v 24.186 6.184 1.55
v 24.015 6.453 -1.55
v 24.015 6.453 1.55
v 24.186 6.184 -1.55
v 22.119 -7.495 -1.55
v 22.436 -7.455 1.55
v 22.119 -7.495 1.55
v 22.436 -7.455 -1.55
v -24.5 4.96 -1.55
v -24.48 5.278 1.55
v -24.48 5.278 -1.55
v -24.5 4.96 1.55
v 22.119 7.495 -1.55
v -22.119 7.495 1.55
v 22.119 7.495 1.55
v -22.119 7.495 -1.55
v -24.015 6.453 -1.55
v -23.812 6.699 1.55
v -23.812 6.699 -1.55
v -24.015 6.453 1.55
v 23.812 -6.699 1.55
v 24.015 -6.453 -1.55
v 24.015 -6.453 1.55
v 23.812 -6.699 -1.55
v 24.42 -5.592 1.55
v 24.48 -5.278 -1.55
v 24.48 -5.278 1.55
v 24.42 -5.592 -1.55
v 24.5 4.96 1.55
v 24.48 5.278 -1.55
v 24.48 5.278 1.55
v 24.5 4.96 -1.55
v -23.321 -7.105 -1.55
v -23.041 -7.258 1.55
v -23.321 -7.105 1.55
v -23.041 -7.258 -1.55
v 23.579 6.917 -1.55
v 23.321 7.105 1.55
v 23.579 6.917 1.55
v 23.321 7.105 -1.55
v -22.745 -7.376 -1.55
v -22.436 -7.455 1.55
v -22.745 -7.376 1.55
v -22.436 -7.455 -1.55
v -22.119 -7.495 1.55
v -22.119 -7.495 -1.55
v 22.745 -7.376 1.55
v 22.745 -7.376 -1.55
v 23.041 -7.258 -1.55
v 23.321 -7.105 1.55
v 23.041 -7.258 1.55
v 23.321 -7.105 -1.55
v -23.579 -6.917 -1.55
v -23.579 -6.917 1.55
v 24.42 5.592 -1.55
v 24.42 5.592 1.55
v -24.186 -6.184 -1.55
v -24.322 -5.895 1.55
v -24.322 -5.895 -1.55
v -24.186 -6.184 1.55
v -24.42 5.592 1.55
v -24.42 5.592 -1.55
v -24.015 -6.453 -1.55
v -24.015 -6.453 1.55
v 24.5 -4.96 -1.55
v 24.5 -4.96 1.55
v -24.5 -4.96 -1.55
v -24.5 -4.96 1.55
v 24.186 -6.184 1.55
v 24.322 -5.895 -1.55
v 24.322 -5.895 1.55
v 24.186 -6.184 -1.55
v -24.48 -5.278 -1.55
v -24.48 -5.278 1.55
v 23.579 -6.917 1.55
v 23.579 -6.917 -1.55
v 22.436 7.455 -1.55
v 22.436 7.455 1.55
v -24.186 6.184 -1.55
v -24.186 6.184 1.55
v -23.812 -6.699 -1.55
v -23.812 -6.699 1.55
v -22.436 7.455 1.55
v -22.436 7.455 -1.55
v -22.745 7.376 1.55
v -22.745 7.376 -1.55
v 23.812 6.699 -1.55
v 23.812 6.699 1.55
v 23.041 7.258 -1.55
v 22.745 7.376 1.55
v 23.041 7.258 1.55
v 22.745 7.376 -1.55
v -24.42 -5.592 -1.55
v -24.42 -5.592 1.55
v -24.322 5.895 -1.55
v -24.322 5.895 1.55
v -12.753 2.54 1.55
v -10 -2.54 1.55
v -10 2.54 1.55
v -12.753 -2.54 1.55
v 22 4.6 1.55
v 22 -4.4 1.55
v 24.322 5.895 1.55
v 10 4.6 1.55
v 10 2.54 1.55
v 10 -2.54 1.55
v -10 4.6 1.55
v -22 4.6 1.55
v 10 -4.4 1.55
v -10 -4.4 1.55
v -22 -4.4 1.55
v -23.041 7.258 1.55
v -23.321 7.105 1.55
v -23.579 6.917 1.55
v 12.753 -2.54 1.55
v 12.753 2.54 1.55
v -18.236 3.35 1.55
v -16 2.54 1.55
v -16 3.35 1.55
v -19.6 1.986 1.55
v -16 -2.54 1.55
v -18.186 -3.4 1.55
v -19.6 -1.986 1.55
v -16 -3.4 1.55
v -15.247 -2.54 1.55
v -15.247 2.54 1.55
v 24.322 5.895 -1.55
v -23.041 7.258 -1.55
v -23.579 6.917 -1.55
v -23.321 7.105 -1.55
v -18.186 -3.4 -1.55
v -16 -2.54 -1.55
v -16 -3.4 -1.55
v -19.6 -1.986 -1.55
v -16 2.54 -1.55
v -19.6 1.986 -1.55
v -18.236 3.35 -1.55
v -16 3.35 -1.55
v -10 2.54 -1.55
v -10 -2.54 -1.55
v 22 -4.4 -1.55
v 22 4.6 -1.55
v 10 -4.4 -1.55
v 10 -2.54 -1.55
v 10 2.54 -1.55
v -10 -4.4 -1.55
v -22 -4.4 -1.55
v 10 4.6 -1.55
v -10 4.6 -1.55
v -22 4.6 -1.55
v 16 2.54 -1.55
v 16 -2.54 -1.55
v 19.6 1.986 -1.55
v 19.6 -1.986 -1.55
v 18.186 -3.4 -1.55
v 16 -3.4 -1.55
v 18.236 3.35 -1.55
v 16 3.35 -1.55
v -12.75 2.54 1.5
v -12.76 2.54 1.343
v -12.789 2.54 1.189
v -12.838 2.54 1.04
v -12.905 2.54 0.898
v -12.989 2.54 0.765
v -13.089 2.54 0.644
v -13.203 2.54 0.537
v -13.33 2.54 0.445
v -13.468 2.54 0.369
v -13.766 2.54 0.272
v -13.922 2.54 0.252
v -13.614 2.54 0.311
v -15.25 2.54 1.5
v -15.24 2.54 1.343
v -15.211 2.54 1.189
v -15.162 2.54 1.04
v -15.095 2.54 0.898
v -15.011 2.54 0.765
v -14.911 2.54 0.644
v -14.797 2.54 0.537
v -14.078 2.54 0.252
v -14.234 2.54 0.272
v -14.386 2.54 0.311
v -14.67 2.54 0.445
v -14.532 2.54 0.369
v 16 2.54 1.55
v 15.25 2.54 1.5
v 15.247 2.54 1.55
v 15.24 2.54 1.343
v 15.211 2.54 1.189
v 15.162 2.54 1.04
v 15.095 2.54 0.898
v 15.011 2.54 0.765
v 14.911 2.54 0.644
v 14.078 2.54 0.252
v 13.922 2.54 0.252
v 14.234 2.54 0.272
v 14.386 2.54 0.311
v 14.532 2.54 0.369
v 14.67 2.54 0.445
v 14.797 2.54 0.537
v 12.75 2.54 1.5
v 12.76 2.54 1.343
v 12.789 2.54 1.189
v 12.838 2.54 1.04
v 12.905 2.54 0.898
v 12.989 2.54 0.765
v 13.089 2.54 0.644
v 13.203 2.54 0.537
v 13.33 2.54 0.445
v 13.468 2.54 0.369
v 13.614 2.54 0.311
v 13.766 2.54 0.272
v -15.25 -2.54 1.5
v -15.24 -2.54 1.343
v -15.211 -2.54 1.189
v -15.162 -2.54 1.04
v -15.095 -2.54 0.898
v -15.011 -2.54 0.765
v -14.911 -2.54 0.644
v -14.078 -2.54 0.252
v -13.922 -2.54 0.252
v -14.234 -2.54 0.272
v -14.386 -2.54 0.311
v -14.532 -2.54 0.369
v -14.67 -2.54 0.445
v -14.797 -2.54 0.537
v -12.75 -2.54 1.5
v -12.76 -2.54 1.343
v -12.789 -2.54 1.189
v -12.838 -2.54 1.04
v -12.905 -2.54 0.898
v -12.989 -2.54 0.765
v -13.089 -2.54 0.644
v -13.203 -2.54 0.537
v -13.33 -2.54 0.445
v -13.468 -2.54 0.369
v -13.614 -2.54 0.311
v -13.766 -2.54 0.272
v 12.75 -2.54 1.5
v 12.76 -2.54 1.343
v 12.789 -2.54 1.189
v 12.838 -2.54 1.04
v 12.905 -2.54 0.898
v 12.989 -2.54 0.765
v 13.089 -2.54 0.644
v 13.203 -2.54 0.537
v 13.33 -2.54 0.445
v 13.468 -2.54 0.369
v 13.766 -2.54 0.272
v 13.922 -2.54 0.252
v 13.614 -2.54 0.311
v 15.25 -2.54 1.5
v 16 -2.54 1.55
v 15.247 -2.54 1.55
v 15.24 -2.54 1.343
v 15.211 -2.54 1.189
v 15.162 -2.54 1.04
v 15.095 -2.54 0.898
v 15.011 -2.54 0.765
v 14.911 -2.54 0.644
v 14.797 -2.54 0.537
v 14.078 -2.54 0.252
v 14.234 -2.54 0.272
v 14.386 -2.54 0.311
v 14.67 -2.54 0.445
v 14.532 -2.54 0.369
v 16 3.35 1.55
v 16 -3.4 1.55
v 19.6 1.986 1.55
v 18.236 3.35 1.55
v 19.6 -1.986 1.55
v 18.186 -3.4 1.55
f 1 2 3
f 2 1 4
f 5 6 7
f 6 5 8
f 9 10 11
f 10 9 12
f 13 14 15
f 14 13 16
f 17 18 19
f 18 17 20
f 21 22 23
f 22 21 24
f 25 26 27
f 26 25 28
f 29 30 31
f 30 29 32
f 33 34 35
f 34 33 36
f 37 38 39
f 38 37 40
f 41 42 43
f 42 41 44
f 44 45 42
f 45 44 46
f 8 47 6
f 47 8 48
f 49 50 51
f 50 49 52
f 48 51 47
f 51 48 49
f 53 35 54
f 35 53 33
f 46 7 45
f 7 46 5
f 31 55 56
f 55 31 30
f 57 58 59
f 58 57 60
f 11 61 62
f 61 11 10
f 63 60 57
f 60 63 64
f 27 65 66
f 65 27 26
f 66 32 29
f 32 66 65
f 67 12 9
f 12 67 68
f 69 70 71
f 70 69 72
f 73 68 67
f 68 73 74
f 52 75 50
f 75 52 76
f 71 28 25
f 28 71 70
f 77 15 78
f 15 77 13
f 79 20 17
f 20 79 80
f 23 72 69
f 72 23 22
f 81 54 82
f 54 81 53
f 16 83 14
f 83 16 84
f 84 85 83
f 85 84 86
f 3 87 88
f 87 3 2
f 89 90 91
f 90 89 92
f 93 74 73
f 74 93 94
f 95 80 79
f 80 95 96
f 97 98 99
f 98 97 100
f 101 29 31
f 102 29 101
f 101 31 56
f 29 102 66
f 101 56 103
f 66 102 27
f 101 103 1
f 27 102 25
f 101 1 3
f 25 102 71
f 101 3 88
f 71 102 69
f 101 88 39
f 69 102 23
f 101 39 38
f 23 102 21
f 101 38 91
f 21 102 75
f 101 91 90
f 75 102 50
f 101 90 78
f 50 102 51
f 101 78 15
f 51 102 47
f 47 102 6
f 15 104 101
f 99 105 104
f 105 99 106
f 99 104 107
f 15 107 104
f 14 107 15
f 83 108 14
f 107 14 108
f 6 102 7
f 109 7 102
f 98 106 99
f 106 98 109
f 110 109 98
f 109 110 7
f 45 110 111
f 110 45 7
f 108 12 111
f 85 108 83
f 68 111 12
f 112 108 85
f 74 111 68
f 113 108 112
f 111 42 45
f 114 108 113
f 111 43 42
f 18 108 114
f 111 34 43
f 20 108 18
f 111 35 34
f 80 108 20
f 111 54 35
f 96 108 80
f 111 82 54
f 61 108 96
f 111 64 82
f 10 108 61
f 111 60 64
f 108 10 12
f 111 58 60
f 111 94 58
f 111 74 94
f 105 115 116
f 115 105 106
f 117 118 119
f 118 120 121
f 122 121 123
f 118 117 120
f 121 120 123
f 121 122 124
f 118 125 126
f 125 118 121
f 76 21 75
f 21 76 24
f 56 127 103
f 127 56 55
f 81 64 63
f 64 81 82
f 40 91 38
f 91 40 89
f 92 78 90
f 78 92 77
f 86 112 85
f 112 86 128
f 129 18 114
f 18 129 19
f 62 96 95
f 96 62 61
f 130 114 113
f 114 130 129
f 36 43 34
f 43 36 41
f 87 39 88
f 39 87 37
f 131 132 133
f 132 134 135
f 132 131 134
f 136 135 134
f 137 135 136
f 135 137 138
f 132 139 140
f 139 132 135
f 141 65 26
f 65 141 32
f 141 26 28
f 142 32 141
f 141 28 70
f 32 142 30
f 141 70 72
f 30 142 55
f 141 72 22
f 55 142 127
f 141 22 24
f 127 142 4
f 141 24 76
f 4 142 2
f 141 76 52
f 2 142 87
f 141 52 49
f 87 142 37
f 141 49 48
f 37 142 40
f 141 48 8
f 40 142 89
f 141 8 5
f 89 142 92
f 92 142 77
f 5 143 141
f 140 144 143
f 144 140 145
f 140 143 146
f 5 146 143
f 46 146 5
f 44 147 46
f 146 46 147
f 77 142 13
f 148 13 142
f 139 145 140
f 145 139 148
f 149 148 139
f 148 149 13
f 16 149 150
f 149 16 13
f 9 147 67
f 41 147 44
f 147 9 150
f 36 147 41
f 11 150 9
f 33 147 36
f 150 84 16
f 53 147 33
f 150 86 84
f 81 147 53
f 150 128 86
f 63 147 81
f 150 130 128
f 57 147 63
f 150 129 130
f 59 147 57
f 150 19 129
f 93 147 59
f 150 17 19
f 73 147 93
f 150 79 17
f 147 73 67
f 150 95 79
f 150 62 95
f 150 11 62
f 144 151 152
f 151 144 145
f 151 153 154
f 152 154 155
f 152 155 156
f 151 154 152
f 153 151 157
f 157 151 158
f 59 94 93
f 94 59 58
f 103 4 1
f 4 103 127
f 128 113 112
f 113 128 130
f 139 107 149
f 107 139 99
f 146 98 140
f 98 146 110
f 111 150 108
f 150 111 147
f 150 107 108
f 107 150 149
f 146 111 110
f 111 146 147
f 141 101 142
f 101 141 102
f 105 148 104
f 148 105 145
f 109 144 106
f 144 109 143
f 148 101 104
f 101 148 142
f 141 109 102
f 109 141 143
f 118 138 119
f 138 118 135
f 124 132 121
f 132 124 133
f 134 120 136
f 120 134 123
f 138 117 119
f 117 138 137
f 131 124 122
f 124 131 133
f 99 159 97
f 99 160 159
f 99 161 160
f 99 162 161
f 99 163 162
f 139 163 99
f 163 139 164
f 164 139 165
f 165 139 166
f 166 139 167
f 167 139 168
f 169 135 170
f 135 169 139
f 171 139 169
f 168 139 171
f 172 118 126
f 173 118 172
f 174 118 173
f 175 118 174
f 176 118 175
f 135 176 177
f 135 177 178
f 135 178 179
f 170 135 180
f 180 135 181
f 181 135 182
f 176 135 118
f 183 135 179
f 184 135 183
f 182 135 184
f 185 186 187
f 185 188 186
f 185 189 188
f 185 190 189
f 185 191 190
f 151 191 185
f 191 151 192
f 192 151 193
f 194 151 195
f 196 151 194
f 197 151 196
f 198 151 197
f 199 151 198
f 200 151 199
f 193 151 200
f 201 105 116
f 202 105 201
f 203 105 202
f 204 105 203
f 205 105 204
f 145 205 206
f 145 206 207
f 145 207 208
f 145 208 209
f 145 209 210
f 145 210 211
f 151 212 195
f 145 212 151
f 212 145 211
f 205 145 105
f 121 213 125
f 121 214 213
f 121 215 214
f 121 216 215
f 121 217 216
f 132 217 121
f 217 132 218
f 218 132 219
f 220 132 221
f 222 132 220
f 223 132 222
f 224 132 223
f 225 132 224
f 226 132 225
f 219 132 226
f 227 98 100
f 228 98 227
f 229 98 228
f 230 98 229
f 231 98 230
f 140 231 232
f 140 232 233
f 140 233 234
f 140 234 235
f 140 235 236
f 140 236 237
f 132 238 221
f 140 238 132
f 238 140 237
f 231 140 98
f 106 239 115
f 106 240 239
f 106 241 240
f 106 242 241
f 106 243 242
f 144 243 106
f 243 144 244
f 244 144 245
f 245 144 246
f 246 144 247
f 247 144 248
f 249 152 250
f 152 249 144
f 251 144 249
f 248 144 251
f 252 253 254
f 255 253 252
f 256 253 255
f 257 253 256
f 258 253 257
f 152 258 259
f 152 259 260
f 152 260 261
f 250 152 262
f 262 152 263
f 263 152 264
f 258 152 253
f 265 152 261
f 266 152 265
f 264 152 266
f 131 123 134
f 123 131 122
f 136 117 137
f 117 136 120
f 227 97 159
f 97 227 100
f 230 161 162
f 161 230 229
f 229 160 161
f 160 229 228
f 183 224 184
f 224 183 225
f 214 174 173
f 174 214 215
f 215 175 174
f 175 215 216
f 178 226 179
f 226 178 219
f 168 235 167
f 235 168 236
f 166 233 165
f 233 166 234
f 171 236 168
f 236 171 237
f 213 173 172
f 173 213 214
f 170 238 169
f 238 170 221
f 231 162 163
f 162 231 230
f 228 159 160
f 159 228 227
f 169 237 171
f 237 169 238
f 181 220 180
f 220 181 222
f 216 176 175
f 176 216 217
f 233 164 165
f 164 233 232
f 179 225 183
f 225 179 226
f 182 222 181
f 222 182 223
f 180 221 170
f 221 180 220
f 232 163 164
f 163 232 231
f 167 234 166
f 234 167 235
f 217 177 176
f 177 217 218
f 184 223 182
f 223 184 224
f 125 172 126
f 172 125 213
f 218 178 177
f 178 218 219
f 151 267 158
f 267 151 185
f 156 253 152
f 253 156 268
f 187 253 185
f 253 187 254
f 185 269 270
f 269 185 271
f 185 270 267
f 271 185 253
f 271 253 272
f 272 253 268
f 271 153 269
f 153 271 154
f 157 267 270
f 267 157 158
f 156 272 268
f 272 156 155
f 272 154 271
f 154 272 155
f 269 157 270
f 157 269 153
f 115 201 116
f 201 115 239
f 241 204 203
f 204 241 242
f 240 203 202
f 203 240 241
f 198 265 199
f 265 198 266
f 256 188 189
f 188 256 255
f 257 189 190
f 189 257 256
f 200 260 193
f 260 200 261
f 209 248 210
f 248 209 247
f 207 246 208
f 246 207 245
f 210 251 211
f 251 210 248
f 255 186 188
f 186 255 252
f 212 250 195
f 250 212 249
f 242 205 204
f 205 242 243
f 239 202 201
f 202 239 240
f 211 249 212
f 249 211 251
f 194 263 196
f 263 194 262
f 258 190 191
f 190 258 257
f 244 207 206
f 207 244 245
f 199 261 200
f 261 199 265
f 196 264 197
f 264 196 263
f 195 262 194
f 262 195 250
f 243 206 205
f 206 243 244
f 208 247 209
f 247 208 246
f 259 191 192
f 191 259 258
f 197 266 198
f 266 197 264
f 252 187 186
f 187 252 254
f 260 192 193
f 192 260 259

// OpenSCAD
ecartement=28; // ecartement fil - wire spacer
epaisseur=3; //epaisseur plaque

$fn=50;
rayon=2.54;
largeur=15;
union(){
    difference(){
        minkowski(){
            cube([ecartement+21-2*rayon,largeur-2*rayon,epaisseur], center=true);
            cylinder(r=rayon, h=0.1, center=true);
        }
        translate([-(ecartement/2)-8,-4.4,-epaisseur/2-0.1])cube([12,9,epaisseur+0.2]);
        translate([(ecartement/2)-4,-4.4,-epaisseur/2-0.1])cube([12,9,epaisseur+0.2]);
    
    }
    
    fixation();
    mirror([1,0,0])fixation();
}

//***********************************************

module fixation(){
    difference(){
        union(){
        translate([-(ecartement/2)-5.6,-3.40,-epaisseur/2-0.05])cube([3.6,6.75,epaisseur+.1]);
        translate([-(ecartement/2)-3.5,-2.54,-epaisseur/2-0.05])cube([17.56,5.08,epaisseur+.1]);
        } // piece de maintien
        union(){
            translate([-(ecartement/2)-5.6,-3.40,0])rotate([0,0,45])cube([2,2,epaisseur+2], center=true);
            translate([-(ecartement/2)-5.6,3.40,0])rotate([0,0,45])cube([2,2,epaisseur+2], center=true);
            translate([-ecartement/2,0,epaisseur/2])rotate([90,0,0])cylinder(d=epaisseur-0.5, h=6, center=true);
        }// chanfreins et passe cable
    }
}
